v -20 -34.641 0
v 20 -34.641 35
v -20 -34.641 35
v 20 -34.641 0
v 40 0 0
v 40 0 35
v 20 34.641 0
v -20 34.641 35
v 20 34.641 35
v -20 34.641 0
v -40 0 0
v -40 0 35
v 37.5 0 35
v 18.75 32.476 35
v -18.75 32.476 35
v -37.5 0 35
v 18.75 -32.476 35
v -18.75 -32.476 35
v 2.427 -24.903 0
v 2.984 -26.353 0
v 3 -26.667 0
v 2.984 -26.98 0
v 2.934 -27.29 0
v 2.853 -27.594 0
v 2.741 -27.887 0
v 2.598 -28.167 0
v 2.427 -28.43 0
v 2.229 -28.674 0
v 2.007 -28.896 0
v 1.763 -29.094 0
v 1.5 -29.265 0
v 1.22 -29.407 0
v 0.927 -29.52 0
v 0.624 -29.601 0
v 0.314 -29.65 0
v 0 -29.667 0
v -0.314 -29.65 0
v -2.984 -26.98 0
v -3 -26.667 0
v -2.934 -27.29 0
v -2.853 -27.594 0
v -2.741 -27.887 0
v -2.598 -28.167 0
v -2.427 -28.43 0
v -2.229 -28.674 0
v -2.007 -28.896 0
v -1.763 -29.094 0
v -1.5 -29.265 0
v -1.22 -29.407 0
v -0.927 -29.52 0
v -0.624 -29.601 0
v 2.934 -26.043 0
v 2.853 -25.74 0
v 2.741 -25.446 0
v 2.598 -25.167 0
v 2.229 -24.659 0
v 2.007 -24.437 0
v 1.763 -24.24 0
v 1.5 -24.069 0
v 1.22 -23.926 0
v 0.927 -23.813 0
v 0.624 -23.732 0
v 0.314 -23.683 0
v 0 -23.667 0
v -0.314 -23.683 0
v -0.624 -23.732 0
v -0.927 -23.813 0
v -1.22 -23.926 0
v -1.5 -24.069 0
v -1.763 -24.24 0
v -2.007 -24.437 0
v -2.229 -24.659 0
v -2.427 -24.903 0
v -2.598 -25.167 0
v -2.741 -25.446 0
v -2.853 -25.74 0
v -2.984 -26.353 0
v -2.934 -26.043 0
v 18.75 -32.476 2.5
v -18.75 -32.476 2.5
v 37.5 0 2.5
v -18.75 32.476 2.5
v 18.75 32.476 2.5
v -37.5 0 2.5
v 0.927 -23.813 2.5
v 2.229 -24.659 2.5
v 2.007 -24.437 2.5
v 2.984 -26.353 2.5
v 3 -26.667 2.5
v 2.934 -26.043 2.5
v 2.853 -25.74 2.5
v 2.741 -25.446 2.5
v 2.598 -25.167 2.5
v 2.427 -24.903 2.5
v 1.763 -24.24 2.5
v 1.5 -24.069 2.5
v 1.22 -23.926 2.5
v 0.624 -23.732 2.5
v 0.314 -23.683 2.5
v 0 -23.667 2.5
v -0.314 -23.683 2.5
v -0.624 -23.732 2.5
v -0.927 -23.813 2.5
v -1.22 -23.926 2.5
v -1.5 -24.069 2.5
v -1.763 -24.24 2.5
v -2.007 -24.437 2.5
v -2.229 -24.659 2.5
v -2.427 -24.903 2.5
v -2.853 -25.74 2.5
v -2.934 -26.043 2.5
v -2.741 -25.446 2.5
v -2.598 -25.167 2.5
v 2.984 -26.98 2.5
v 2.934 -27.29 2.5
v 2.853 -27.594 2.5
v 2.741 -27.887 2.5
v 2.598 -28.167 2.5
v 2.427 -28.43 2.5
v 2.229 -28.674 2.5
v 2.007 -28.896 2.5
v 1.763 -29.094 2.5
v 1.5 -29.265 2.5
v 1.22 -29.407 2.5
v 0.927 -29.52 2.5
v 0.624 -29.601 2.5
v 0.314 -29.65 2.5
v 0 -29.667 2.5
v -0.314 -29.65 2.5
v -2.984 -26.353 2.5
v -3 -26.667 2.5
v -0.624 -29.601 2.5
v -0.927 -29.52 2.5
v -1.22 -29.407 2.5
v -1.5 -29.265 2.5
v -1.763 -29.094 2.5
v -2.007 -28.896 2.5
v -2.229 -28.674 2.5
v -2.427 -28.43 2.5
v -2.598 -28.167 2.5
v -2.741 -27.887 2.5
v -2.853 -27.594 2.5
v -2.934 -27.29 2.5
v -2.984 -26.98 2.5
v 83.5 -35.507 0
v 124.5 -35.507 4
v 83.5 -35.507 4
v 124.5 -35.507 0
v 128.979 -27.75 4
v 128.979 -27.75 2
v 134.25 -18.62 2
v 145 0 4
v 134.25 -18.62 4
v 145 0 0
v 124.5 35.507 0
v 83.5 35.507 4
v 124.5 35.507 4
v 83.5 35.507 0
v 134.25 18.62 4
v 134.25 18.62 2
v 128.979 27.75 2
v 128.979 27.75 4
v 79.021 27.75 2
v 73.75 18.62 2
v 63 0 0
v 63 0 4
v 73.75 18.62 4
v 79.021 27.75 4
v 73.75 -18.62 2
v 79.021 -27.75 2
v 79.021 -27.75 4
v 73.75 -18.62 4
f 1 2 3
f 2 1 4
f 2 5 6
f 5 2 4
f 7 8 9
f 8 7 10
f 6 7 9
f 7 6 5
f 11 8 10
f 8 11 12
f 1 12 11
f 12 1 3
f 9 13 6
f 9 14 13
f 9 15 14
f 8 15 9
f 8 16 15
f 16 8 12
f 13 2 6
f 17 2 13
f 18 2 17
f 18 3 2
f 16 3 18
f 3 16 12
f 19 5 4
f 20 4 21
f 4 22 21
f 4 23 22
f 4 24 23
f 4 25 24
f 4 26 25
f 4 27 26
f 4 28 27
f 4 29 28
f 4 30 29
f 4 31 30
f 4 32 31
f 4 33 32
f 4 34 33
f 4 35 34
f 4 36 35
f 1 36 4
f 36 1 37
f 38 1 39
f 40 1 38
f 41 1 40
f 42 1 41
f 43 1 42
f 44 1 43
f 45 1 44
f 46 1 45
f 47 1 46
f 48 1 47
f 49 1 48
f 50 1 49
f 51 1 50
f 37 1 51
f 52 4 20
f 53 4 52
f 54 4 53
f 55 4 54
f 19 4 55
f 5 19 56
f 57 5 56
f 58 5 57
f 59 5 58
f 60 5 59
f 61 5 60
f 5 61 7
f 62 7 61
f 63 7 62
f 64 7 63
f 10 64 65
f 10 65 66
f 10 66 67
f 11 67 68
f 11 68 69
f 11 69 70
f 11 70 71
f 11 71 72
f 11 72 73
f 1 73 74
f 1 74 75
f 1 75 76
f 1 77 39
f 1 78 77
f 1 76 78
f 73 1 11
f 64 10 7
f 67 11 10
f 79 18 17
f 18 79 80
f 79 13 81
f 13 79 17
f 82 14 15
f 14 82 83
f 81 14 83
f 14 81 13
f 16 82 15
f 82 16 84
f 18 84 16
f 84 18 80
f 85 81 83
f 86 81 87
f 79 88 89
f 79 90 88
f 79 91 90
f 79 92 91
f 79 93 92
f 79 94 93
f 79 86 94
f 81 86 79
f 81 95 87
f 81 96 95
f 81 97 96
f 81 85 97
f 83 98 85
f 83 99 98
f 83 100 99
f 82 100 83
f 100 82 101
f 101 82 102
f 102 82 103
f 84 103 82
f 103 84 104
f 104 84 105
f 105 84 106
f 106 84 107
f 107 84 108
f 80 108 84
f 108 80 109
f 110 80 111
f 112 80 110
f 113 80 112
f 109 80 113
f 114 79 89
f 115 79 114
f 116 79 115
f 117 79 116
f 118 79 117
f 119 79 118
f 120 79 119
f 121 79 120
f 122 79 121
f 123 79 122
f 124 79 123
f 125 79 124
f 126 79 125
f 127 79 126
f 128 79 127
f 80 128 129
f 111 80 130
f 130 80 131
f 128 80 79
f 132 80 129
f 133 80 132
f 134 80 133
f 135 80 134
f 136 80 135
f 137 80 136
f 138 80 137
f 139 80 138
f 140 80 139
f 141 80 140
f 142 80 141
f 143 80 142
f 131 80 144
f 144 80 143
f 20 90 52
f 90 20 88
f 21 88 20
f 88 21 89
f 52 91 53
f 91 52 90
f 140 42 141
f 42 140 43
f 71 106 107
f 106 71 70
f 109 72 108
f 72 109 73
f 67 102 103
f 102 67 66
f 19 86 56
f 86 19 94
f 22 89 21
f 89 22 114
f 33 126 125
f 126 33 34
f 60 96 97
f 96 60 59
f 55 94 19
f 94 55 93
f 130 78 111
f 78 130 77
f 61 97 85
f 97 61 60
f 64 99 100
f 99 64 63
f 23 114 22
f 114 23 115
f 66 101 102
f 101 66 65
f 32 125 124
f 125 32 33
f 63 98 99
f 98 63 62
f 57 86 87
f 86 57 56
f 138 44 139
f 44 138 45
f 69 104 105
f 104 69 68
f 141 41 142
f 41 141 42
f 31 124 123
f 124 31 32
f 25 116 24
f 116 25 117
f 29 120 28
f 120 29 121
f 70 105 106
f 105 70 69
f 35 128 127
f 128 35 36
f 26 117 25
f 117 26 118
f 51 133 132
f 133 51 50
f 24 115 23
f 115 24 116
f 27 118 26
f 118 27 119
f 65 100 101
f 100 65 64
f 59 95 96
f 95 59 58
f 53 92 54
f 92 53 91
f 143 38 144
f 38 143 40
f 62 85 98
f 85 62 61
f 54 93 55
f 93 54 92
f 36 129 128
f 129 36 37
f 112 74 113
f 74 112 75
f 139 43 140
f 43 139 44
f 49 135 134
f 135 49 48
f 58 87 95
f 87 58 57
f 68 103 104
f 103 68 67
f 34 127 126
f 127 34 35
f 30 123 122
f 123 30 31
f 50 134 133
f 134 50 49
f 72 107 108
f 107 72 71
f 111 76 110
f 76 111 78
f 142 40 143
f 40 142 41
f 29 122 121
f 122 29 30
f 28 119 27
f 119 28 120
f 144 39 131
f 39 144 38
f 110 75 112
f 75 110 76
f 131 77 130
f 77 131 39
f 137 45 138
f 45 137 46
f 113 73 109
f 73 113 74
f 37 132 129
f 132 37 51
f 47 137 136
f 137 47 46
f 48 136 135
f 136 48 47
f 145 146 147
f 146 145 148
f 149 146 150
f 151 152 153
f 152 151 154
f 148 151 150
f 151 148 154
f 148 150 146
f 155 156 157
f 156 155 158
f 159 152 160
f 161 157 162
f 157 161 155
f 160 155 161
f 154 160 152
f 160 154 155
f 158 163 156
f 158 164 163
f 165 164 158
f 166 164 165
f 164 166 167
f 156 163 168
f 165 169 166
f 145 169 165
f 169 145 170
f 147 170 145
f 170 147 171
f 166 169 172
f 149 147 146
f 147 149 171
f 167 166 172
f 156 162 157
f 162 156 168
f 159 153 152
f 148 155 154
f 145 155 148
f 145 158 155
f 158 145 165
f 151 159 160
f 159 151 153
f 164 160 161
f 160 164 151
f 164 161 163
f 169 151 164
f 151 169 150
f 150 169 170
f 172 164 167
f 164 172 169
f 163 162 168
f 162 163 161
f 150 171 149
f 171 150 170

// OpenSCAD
// ============================================================================
// BEEVIL KNIEVEL — 3D Printable IP67 Hexagonal Hive Node Enclosure
// Compatible with OpenSCAD / FreeCAD -> Export STL for 3D Printing
// Fits: RAK4631, 1000mAh LiPo, 1W Solar Panel (60x55mm), ICS-43434 Mic Port
// ============================================================================

$fn = 60;

// Outer Dimensions
width_mm = 80.0;
height_mm = 90.0;
depth_mm = 35.0;
wall_thickness = 2.5;

// Solar Panel Recess Dimensions (Top Lid)
solar_w = 60.5;
solar_h = 55.5;
solar_d = 2.0;

module hex_body() {
    difference() {
        // Outer Hexagonal Shell
        cylinder(r = width_mm / 2, h = depth_mm, $fn = 6);
        
        // Inner Cavity
        translate([0, 0, wall_thickness])
            cylinder(r = (width_mm / 2) - wall_thickness, h = depth_mm, $fn = 6);
            
        // ICS-43434 Acoustic Mic Port (Bottom Vented Hole)
        translate([0, -width_mm/3, -1])
            cylinder(r = 3.0, h = wall_thickness + 2);
            
        // Cable Gland Hole for 1-Wire Temp Probes
        translate([width_mm/3, 0, depth_mm/2])
            rotate([0, 90, 0])
                cylinder(r = 4.0, h = wall_thickness + 2);
    }
}

module top_lid_with_solar_recess() {
    difference() {
        // Hex Lid Cap
        cylinder(r = (width_mm / 2) + 1.0, h = 4.0, $fn = 6);
        
        // Solar Panel Recess Slot
        translate([-solar_w/2, -solar_h/2, 2.0])
            cube([solar_w, solar_h, solar_d + 1.0]);
    }
}

// Render Main Body
translate([0, 0, 0]) hex_body();

// Render Top Lid (Separated for printing)
translate([width_mm * 1.3, 0, 0]) top_lid_with_solar_recess();
